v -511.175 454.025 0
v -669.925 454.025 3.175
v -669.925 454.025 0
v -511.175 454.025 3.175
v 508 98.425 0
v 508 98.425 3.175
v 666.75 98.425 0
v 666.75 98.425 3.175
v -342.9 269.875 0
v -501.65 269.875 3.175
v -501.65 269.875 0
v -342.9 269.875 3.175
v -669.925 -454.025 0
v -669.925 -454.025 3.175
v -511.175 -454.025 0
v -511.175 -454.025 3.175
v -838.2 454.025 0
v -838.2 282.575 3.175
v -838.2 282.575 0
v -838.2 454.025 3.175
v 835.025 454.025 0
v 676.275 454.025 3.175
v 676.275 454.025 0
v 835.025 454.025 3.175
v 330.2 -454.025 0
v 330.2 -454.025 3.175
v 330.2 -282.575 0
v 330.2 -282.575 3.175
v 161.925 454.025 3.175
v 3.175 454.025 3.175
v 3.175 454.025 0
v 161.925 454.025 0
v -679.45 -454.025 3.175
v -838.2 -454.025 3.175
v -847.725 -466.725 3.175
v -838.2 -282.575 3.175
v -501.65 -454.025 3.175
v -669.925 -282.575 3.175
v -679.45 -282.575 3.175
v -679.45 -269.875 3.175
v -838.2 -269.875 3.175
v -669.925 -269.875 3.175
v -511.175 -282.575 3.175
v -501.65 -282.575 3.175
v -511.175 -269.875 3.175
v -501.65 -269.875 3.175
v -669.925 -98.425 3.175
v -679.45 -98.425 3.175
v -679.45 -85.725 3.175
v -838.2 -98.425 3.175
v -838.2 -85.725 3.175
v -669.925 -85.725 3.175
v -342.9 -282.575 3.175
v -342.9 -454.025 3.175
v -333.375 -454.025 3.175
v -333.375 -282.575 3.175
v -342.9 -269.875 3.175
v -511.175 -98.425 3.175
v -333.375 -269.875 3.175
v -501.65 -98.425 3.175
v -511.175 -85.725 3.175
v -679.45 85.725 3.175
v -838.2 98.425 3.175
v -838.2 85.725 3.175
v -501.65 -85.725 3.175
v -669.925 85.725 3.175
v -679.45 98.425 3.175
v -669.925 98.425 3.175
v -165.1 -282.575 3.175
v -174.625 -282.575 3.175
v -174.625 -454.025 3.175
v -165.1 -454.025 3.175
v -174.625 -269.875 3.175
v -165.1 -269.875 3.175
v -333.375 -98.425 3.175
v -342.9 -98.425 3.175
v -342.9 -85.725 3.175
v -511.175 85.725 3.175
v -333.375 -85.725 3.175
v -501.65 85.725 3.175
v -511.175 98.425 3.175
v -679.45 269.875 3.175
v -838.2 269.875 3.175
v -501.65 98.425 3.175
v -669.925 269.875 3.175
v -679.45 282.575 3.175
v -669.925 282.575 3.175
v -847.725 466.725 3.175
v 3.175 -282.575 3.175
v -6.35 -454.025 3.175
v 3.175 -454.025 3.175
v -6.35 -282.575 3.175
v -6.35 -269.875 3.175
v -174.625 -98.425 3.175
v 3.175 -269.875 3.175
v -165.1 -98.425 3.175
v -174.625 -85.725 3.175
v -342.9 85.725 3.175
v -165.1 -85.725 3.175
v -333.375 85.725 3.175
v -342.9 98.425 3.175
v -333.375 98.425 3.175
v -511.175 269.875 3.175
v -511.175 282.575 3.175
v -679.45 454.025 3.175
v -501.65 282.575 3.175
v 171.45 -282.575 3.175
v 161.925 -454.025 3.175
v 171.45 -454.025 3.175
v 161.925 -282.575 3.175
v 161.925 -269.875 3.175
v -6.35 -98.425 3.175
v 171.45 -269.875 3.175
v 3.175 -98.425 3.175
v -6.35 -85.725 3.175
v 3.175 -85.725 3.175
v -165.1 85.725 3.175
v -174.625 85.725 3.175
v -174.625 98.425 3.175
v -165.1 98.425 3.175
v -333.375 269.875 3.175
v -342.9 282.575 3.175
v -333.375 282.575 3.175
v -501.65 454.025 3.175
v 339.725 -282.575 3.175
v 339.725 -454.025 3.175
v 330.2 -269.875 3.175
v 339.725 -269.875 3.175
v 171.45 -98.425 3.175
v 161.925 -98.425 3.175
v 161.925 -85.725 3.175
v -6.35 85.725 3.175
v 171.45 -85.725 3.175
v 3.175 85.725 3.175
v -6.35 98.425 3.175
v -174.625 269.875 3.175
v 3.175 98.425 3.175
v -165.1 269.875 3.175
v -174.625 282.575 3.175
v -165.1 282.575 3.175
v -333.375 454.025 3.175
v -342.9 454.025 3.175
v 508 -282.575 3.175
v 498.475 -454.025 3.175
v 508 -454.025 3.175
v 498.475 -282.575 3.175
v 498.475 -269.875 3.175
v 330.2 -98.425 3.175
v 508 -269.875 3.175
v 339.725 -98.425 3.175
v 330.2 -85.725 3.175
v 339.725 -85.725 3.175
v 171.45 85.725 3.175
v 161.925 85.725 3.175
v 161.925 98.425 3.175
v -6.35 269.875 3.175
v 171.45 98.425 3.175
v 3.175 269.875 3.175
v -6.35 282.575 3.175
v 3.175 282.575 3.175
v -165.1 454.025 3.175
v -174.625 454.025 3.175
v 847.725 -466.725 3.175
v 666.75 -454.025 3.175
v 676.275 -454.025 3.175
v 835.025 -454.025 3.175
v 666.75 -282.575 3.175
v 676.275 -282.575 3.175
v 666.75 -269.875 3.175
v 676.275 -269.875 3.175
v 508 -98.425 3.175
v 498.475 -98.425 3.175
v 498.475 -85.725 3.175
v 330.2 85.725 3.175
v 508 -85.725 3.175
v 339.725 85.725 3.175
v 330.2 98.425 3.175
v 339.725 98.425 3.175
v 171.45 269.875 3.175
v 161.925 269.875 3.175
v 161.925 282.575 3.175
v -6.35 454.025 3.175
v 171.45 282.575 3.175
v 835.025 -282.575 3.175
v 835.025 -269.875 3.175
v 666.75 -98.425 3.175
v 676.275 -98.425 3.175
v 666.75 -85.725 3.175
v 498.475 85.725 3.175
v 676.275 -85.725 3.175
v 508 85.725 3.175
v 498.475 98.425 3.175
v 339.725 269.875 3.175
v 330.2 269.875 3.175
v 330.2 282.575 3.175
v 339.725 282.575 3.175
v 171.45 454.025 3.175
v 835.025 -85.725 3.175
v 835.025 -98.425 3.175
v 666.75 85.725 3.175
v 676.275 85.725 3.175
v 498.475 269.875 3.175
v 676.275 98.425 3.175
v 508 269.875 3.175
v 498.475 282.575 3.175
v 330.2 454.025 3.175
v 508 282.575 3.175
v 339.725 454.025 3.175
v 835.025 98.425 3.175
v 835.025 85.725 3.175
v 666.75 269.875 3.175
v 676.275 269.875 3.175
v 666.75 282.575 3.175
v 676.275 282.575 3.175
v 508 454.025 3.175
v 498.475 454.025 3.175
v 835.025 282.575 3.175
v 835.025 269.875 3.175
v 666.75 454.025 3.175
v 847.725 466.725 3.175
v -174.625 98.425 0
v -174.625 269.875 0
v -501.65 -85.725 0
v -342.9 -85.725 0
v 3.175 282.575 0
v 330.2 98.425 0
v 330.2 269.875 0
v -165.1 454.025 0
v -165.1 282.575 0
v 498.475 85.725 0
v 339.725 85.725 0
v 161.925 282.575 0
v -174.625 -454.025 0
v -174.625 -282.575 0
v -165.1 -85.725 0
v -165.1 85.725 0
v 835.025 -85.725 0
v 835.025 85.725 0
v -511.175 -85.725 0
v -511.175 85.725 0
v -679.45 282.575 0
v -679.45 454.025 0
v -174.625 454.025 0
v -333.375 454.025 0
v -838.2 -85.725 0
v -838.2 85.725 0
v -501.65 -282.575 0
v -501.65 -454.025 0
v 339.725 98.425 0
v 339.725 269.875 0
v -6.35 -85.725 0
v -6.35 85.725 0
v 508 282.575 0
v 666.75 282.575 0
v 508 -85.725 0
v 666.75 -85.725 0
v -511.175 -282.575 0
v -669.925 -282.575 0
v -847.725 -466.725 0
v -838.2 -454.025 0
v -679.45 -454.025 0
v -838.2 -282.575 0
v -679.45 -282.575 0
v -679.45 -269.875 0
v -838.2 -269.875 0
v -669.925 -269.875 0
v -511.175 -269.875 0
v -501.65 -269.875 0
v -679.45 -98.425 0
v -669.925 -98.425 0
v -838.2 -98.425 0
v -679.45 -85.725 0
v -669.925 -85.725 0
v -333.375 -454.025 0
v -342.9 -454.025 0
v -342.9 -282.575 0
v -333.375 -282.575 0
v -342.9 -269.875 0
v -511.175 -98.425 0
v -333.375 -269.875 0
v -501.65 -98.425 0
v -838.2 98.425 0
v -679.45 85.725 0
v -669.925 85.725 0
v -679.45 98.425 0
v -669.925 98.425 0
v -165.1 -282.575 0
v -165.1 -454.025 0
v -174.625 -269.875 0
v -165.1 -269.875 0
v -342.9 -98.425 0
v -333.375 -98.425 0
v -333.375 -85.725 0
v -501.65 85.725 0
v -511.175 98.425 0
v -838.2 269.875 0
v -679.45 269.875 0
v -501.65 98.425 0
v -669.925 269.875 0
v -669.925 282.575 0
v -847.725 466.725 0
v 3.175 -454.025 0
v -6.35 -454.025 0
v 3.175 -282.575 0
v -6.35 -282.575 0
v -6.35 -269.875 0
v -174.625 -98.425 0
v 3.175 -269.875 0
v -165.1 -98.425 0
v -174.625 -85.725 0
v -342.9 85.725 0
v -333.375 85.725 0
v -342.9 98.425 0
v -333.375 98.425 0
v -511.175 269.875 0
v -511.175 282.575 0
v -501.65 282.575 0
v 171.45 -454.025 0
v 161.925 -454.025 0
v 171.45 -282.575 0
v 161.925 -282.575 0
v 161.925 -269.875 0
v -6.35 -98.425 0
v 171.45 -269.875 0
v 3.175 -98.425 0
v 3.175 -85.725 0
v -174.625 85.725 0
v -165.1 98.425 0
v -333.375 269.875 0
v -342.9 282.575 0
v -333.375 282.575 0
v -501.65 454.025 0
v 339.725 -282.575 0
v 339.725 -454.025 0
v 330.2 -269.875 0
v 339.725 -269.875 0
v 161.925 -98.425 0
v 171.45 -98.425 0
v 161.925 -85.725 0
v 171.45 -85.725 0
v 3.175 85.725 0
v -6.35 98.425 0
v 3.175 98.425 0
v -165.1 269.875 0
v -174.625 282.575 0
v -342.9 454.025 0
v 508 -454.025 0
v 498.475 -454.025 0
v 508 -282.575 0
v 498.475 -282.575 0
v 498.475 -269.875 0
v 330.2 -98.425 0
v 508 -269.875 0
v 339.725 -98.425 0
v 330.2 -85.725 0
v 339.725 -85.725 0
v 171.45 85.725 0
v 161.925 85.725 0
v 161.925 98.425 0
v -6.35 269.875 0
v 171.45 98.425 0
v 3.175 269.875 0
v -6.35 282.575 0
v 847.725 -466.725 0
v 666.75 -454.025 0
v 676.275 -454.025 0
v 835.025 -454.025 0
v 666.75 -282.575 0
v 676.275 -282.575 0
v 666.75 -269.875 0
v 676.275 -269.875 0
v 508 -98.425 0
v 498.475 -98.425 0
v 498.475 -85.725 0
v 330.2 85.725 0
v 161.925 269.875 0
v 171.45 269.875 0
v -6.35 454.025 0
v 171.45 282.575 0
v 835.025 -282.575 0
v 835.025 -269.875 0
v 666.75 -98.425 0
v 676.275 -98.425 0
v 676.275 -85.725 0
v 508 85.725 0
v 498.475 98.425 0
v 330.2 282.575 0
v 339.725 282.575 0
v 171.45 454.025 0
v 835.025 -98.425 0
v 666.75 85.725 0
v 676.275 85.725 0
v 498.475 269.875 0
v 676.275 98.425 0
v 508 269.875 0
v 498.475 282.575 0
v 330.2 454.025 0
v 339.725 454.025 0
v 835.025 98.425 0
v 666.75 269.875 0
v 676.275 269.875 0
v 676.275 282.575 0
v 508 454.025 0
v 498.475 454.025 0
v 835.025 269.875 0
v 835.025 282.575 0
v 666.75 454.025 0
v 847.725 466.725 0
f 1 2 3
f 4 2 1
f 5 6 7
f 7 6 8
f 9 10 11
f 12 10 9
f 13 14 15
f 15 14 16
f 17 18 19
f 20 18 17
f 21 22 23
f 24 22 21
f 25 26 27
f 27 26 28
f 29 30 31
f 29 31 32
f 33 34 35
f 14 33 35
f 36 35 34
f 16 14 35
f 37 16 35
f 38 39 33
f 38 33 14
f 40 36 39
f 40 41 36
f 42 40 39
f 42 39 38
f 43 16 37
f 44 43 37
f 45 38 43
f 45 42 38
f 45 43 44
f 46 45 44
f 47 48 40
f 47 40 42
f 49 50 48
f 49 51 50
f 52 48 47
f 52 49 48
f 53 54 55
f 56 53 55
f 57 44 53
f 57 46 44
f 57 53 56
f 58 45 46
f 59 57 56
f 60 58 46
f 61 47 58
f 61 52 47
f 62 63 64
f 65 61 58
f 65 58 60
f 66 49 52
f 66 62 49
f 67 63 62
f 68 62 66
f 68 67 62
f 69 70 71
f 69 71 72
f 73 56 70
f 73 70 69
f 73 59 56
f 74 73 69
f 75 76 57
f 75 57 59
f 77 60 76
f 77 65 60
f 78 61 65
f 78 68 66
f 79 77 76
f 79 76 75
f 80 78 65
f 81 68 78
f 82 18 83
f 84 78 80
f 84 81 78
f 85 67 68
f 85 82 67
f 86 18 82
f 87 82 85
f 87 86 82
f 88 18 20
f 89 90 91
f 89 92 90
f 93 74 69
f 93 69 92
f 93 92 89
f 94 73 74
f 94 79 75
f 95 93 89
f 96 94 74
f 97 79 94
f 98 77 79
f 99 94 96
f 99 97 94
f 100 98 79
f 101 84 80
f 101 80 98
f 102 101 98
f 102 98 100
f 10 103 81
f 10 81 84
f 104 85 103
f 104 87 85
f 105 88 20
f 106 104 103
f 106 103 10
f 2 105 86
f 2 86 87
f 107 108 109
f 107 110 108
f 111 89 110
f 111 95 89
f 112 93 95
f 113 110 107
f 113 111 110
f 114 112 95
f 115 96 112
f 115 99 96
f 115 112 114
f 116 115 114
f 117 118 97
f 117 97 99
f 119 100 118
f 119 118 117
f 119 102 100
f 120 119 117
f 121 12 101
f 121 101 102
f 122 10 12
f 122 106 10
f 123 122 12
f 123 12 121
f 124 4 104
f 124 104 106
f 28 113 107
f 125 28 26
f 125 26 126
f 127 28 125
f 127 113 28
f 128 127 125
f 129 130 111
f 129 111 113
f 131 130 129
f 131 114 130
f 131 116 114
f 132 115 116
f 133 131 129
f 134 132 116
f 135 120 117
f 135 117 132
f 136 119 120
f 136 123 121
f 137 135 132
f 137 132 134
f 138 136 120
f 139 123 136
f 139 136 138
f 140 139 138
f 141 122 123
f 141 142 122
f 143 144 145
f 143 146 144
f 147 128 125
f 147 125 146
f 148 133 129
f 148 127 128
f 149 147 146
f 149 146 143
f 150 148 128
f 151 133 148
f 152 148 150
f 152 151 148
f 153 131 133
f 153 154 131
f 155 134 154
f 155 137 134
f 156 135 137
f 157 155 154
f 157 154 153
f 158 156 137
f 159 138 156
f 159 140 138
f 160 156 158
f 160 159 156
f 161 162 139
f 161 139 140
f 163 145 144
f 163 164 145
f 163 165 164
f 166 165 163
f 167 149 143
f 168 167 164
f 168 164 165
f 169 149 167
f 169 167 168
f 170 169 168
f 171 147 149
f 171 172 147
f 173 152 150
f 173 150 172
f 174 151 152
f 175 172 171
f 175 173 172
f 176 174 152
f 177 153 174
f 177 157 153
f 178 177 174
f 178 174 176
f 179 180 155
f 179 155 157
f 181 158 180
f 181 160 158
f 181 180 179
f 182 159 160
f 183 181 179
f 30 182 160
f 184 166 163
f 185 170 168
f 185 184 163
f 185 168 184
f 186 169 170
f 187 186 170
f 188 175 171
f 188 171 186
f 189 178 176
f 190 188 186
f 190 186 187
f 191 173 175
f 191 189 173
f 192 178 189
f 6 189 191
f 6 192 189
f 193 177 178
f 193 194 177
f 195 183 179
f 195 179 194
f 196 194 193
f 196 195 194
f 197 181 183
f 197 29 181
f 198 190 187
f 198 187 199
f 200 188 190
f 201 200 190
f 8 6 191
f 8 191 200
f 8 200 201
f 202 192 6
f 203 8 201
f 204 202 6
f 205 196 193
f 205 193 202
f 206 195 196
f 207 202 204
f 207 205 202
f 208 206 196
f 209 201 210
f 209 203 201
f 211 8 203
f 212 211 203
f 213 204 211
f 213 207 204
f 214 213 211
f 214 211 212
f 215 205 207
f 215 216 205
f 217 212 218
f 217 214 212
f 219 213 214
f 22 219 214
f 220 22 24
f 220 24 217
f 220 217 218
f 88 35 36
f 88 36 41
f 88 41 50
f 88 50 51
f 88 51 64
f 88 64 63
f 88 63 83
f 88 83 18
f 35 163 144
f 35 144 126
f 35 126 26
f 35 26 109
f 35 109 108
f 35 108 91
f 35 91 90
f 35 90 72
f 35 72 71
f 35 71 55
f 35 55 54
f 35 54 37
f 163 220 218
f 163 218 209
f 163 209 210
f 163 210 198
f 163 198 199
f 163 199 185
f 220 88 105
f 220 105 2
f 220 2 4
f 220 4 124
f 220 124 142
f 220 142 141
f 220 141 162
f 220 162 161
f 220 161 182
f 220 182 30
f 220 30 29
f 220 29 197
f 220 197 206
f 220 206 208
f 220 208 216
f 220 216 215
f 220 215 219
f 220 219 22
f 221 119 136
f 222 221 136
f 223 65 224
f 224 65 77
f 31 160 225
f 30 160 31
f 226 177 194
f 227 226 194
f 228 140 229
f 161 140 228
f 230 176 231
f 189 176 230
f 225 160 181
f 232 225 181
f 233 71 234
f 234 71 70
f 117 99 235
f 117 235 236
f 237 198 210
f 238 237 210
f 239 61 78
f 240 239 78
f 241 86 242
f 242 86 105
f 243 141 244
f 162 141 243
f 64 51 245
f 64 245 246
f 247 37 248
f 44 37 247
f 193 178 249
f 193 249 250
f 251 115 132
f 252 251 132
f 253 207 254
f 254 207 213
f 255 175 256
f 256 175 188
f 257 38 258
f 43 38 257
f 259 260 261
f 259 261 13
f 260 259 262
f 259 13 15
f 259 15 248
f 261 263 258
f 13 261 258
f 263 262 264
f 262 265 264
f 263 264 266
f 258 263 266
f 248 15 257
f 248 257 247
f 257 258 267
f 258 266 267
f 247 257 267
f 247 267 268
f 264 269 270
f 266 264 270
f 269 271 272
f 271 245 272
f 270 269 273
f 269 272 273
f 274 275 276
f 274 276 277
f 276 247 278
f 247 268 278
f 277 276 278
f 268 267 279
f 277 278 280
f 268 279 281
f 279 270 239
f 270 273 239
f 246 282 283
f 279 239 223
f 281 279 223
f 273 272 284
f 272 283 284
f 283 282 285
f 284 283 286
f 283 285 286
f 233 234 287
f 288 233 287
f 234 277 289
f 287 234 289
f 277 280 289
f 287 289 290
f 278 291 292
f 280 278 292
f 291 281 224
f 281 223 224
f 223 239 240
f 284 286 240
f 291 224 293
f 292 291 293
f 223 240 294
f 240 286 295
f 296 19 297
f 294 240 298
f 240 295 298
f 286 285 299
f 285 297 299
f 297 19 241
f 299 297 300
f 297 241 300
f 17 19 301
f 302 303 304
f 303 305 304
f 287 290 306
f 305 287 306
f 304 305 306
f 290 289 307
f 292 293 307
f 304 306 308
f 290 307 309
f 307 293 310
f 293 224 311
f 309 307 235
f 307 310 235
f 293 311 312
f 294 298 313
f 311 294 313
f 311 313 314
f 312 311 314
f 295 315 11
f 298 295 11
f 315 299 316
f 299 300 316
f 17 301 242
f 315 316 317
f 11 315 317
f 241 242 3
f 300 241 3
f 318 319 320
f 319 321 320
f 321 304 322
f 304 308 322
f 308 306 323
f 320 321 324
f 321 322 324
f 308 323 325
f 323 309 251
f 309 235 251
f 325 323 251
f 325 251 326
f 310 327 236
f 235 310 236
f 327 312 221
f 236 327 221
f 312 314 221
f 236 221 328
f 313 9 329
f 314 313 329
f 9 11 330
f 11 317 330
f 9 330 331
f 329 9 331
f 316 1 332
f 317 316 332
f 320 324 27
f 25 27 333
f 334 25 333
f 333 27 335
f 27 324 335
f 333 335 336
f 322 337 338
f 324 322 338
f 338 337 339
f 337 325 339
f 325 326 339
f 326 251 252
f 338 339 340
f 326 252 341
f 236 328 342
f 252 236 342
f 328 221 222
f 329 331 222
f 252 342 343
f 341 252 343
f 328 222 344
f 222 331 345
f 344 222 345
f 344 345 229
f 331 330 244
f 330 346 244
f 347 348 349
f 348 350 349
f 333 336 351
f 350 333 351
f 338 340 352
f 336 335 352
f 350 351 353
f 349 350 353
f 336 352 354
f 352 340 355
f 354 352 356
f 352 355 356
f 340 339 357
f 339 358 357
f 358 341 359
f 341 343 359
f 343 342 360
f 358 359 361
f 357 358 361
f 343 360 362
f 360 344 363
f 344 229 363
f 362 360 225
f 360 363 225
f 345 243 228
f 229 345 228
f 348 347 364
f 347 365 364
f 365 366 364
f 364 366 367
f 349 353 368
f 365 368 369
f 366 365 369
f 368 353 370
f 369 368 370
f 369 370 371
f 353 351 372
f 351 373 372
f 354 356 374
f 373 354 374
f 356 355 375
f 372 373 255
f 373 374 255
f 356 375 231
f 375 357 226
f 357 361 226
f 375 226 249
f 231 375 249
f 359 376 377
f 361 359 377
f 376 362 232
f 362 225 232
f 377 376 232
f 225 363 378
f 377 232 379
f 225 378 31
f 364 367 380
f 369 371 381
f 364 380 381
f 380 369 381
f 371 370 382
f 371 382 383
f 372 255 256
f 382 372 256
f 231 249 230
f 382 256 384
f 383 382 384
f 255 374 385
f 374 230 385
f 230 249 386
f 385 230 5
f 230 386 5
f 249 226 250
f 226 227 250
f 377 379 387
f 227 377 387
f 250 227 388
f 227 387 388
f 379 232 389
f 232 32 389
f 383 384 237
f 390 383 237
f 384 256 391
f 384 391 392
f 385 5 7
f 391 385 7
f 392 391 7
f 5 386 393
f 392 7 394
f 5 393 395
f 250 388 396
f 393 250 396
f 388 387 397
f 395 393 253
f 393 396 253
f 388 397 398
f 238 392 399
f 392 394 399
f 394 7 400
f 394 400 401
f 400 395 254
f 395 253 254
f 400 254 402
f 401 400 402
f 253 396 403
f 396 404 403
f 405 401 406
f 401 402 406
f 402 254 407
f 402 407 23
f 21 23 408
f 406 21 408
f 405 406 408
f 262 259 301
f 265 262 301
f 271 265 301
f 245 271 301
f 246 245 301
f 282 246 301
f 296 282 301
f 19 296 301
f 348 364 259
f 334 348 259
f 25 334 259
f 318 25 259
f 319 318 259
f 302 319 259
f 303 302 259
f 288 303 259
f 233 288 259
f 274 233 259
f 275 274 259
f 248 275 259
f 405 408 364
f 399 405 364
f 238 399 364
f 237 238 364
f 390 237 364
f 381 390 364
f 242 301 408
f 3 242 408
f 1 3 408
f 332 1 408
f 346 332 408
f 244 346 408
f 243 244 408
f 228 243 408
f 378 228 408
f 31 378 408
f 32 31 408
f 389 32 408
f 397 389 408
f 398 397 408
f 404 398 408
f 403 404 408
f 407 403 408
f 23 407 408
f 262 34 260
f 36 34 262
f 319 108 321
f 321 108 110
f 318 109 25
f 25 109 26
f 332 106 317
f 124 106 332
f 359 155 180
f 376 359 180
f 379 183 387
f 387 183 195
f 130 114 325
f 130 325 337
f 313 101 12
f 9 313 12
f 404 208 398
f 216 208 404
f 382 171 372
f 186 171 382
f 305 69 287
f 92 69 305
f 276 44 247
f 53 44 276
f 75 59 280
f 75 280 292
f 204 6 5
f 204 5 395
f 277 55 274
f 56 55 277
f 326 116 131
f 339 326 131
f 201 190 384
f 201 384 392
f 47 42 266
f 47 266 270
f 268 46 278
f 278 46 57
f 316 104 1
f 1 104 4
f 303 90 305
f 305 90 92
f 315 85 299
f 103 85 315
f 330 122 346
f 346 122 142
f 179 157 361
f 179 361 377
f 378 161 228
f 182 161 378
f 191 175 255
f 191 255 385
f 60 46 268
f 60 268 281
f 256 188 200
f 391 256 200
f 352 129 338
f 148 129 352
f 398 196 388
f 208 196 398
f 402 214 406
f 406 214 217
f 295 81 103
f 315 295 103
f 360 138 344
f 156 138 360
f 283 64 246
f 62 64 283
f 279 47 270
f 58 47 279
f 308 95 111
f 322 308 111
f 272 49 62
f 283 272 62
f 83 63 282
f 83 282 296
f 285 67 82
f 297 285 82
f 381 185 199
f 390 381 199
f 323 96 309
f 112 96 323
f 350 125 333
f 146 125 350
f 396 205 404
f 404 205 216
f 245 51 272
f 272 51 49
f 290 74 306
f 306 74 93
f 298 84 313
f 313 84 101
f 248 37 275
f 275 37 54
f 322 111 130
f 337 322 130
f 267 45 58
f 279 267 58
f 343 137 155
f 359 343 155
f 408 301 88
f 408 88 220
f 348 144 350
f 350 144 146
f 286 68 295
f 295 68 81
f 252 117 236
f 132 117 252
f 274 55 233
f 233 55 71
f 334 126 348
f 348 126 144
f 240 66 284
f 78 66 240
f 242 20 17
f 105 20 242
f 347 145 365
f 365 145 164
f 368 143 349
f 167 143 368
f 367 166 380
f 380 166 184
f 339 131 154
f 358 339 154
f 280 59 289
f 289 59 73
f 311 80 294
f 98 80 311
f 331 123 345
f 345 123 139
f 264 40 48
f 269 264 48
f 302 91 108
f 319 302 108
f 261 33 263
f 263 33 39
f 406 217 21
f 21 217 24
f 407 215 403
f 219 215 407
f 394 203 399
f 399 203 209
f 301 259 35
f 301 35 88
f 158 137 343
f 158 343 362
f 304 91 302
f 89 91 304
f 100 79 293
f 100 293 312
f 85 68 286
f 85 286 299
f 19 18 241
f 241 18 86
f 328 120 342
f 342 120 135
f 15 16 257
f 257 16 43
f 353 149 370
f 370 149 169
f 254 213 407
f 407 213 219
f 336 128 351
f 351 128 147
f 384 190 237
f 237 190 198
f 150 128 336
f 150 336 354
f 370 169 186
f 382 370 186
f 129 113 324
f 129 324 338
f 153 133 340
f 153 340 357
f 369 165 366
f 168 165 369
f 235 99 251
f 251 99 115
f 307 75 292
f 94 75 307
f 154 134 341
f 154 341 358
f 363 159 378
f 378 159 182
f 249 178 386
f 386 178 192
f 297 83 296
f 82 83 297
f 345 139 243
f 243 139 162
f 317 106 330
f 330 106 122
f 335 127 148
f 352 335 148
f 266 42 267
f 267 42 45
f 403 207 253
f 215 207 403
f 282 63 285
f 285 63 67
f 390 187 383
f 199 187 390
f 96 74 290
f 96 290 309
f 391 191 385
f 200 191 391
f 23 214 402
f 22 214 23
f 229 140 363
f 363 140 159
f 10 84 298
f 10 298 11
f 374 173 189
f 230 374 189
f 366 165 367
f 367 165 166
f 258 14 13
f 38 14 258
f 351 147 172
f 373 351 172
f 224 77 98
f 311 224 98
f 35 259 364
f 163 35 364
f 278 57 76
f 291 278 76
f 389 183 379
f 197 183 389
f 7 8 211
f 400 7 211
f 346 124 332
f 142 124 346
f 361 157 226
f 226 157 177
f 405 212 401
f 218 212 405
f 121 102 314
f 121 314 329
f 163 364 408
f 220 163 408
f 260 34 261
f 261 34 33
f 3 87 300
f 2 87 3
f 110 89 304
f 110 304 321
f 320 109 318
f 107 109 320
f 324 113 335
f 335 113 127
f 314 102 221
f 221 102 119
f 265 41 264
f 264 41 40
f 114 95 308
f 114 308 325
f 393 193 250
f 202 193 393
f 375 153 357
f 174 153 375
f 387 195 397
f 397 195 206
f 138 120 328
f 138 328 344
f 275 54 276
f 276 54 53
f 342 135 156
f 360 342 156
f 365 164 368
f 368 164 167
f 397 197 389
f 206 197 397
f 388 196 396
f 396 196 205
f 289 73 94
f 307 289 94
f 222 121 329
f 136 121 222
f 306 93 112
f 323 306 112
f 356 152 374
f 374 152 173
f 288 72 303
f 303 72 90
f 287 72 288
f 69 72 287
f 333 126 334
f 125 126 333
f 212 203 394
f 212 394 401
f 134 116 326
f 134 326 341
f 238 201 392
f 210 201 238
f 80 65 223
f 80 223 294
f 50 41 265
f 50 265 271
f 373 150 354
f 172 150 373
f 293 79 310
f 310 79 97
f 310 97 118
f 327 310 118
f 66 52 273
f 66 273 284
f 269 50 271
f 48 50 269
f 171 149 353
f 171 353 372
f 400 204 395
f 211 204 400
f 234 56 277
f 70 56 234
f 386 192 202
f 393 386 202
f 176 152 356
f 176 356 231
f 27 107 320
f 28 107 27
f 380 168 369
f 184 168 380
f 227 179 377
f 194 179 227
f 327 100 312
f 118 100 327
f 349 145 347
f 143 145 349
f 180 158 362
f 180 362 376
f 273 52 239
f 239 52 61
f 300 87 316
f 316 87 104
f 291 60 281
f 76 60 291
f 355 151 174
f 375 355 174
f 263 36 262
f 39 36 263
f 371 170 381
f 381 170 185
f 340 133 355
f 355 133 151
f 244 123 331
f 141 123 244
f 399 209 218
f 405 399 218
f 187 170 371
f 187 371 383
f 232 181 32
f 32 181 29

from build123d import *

# Parameters (mm, degrees)
SKETCH1_W           = 1695.45
SKETCH1_H           = 933.45
BOSS_EXTRUDE1_DEPTH = 3.175
SKETCH2_W           = 158.75
SKETCH2_H           = 171.45
CUT_EXTRUDE1_DEPTH  = 4.175


with BuildPart() as part:
    # Sketch1 → Boss-Extrude1 (new body)
    with BuildSketch(Plane.XY):
        Rectangle(SKETCH1_W, SKETCH1_H)
    extrude(amount=BOSS_EXTRUDE1_DEPTH)

    # Sketch2 → Cut-Extrude1 (cut, through all)
    with BuildSketch(Plane.XY.offset(3.175)):
        with Locations((-758.825, 368.3)):
            Rectangle(SKETCH2_W, SKETCH2_H)
        with Locations((-590.55, 368.3)):
            Rectangle(SKETCH2_W, SKETCH2_H)
        with Locations((-422.275, 368.3)):
            Rectangle(SKETCH2_W, SKETCH2_H)
        with Locations((-254, 368.3)):
            Rectangle(SKETCH2_W, SKETCH2_H)
        with Locations((-85.725, 368.3)):
            Rectangle(SKETCH2_W, SKETCH2_H)
        with Locations((82.55, 368.3)):
            Rectangle(SKETCH2_W, SKETCH2_H)
        with Locations((250.825, 368.3)):
            Rectangle(SKETCH2_W, SKETCH2_H)
        with Locations((419.1, 368.3)):
            Rectangle(SKETCH2_W, SKETCH2_H)
        with Locations((587.375, 368.3)):
            Rectangle(SKETCH2_W, SKETCH2_H)
        with Locations((755.65, 368.3)):
            Rectangle(SKETCH2_W, SKETCH2_H)
        with Locations((-590.55, 184.15)):
            Rectangle(SKETCH2_W, SKETCH2_H)
        with Locations((-422.275, 184.15)):
            Rectangle(SKETCH2_W, SKETCH2_H)
        with Locations((-254, 184.15)):
            Rectangle(SKETCH2_W, SKETCH2_H)
        with Locations((-85.725, 184.15)):
            Rectangle(SKETCH2_W, SKETCH2_H)
        with Locations((82.55, 184.15)):
            Rectangle(SKETCH2_W, SKETCH2_H)
        with Locations((250.825, 184.15)):
            Rectangle(SKETCH2_W, SKETCH2_H)
        with Locations((419.1, 184.15)):
            Rectangle(SKETCH2_W, SKETCH2_H)
        with Locations((587.375, 184.15)):
            Rectangle(SKETCH2_W, SKETCH2_H)
        with Locations((755.65, 184.15)):
            Rectangle(SKETCH2_W, SKETCH2_H)
        with Locations((-590.55, 0)):
            Rectangle(SKETCH2_W, SKETCH2_H)
        with Locations((-422.275, 0)):
            Rectangle(SKETCH2_W, SKETCH2_H)
        with Locations((-254, 0)):
            Rectangle(SKETCH2_W, SKETCH2_H)
        with Locations((-85.725, 0)):
            Rectangle(SKETCH2_W, SKETCH2_H)
        with Locations((82.55, 0)):
            Rectangle(SKETCH2_W, SKETCH2_H)
        with Locations((250.825, 0)):
            Rectangle(SKETCH2_W, SKETCH2_H)
        with Locations((419.1, 0)):
            Rectangle(SKETCH2_W, SKETCH2_H)
        with Locations((587.375, 0)):
            Rectangle(SKETCH2_W, SKETCH2_H)
        with Locations((755.65, 0)):
            Rectangle(SKETCH2_W, SKETCH2_H)
        with Locations((-590.55, -184.15)):
            Rectangle(SKETCH2_W, SKETCH2_H)
        with Locations((-422.275, -184.15)):
            Rectangle(SKETCH2_W, SKETCH2_H)
        with Locations((-254, -184.15)):
            Rectangle(SKETCH2_W, SKETCH2_H)
        with Locations((-85.725, -184.15)):
            Rectangle(SKETCH2_W, SKETCH2_H)
        with Locations((82.55, -184.15)):
            Rectangle(SKETCH2_W, SKETCH2_H)
        with Locations((250.825, -184.15)):
            Rectangle(SKETCH2_W, SKETCH2_H)
        with Locations((419.1, -184.15)):
            Rectangle(SKETCH2_W, SKETCH2_H)
        with Locations((587.375, -184.15)):
            Rectangle(SKETCH2_W, SKETCH2_H)
        with Locations((755.65, -184.15)):
            Rectangle(SKETCH2_W, SKETCH2_H)
        with Locations((-590.55, -368.3)):
            Rectangle(SKETCH2_W, SKETCH2_H)
        with Locations((-422.275, -368.3)):
            Rectangle(SKETCH2_W, SKETCH2_H)
        with Locations((-254, -368.3)):
            Rectangle(SKETCH2_W, SKETCH2_H)
        with Locations((-85.725, -368.3)):
            Rectangle(SKETCH2_W, SKETCH2_H)
        with Locations((82.55, -368.3)):
            Rectangle(SKETCH2_W, SKETCH2_H)
        with Locations((250.825, -368.3)):
            Rectangle(SKETCH2_W, SKETCH2_H)
        with Locations((419.1, -368.3)):
            Rectangle(SKETCH2_W, SKETCH2_H)
        with Locations((587.375, -368.3)):
            Rectangle(SKETCH2_W, SKETCH2_H)
        with Locations((755.65, -368.3)):
            Rectangle(SKETCH2_W, SKETCH2_H)
        with Locations((-758.825, 184.15)):
            Rectangle(SKETCH2_W, SKETCH2_H)
        with Locations((-758.825, 0)):
            Rectangle(SKETCH2_W, SKETCH2_H)
        with Locations((-758.825, -184.15)):
            Rectangle(SKETCH2_W, SKETCH2_H)
        with Locations((-758.825, -368.3)):
            Rectangle(SKETCH2_W, SKETCH2_H)
    extrude(amount=-CUT_EXTRUDE1_DEPTH, mode=Mode.SUBTRACT)


solid = part.part
